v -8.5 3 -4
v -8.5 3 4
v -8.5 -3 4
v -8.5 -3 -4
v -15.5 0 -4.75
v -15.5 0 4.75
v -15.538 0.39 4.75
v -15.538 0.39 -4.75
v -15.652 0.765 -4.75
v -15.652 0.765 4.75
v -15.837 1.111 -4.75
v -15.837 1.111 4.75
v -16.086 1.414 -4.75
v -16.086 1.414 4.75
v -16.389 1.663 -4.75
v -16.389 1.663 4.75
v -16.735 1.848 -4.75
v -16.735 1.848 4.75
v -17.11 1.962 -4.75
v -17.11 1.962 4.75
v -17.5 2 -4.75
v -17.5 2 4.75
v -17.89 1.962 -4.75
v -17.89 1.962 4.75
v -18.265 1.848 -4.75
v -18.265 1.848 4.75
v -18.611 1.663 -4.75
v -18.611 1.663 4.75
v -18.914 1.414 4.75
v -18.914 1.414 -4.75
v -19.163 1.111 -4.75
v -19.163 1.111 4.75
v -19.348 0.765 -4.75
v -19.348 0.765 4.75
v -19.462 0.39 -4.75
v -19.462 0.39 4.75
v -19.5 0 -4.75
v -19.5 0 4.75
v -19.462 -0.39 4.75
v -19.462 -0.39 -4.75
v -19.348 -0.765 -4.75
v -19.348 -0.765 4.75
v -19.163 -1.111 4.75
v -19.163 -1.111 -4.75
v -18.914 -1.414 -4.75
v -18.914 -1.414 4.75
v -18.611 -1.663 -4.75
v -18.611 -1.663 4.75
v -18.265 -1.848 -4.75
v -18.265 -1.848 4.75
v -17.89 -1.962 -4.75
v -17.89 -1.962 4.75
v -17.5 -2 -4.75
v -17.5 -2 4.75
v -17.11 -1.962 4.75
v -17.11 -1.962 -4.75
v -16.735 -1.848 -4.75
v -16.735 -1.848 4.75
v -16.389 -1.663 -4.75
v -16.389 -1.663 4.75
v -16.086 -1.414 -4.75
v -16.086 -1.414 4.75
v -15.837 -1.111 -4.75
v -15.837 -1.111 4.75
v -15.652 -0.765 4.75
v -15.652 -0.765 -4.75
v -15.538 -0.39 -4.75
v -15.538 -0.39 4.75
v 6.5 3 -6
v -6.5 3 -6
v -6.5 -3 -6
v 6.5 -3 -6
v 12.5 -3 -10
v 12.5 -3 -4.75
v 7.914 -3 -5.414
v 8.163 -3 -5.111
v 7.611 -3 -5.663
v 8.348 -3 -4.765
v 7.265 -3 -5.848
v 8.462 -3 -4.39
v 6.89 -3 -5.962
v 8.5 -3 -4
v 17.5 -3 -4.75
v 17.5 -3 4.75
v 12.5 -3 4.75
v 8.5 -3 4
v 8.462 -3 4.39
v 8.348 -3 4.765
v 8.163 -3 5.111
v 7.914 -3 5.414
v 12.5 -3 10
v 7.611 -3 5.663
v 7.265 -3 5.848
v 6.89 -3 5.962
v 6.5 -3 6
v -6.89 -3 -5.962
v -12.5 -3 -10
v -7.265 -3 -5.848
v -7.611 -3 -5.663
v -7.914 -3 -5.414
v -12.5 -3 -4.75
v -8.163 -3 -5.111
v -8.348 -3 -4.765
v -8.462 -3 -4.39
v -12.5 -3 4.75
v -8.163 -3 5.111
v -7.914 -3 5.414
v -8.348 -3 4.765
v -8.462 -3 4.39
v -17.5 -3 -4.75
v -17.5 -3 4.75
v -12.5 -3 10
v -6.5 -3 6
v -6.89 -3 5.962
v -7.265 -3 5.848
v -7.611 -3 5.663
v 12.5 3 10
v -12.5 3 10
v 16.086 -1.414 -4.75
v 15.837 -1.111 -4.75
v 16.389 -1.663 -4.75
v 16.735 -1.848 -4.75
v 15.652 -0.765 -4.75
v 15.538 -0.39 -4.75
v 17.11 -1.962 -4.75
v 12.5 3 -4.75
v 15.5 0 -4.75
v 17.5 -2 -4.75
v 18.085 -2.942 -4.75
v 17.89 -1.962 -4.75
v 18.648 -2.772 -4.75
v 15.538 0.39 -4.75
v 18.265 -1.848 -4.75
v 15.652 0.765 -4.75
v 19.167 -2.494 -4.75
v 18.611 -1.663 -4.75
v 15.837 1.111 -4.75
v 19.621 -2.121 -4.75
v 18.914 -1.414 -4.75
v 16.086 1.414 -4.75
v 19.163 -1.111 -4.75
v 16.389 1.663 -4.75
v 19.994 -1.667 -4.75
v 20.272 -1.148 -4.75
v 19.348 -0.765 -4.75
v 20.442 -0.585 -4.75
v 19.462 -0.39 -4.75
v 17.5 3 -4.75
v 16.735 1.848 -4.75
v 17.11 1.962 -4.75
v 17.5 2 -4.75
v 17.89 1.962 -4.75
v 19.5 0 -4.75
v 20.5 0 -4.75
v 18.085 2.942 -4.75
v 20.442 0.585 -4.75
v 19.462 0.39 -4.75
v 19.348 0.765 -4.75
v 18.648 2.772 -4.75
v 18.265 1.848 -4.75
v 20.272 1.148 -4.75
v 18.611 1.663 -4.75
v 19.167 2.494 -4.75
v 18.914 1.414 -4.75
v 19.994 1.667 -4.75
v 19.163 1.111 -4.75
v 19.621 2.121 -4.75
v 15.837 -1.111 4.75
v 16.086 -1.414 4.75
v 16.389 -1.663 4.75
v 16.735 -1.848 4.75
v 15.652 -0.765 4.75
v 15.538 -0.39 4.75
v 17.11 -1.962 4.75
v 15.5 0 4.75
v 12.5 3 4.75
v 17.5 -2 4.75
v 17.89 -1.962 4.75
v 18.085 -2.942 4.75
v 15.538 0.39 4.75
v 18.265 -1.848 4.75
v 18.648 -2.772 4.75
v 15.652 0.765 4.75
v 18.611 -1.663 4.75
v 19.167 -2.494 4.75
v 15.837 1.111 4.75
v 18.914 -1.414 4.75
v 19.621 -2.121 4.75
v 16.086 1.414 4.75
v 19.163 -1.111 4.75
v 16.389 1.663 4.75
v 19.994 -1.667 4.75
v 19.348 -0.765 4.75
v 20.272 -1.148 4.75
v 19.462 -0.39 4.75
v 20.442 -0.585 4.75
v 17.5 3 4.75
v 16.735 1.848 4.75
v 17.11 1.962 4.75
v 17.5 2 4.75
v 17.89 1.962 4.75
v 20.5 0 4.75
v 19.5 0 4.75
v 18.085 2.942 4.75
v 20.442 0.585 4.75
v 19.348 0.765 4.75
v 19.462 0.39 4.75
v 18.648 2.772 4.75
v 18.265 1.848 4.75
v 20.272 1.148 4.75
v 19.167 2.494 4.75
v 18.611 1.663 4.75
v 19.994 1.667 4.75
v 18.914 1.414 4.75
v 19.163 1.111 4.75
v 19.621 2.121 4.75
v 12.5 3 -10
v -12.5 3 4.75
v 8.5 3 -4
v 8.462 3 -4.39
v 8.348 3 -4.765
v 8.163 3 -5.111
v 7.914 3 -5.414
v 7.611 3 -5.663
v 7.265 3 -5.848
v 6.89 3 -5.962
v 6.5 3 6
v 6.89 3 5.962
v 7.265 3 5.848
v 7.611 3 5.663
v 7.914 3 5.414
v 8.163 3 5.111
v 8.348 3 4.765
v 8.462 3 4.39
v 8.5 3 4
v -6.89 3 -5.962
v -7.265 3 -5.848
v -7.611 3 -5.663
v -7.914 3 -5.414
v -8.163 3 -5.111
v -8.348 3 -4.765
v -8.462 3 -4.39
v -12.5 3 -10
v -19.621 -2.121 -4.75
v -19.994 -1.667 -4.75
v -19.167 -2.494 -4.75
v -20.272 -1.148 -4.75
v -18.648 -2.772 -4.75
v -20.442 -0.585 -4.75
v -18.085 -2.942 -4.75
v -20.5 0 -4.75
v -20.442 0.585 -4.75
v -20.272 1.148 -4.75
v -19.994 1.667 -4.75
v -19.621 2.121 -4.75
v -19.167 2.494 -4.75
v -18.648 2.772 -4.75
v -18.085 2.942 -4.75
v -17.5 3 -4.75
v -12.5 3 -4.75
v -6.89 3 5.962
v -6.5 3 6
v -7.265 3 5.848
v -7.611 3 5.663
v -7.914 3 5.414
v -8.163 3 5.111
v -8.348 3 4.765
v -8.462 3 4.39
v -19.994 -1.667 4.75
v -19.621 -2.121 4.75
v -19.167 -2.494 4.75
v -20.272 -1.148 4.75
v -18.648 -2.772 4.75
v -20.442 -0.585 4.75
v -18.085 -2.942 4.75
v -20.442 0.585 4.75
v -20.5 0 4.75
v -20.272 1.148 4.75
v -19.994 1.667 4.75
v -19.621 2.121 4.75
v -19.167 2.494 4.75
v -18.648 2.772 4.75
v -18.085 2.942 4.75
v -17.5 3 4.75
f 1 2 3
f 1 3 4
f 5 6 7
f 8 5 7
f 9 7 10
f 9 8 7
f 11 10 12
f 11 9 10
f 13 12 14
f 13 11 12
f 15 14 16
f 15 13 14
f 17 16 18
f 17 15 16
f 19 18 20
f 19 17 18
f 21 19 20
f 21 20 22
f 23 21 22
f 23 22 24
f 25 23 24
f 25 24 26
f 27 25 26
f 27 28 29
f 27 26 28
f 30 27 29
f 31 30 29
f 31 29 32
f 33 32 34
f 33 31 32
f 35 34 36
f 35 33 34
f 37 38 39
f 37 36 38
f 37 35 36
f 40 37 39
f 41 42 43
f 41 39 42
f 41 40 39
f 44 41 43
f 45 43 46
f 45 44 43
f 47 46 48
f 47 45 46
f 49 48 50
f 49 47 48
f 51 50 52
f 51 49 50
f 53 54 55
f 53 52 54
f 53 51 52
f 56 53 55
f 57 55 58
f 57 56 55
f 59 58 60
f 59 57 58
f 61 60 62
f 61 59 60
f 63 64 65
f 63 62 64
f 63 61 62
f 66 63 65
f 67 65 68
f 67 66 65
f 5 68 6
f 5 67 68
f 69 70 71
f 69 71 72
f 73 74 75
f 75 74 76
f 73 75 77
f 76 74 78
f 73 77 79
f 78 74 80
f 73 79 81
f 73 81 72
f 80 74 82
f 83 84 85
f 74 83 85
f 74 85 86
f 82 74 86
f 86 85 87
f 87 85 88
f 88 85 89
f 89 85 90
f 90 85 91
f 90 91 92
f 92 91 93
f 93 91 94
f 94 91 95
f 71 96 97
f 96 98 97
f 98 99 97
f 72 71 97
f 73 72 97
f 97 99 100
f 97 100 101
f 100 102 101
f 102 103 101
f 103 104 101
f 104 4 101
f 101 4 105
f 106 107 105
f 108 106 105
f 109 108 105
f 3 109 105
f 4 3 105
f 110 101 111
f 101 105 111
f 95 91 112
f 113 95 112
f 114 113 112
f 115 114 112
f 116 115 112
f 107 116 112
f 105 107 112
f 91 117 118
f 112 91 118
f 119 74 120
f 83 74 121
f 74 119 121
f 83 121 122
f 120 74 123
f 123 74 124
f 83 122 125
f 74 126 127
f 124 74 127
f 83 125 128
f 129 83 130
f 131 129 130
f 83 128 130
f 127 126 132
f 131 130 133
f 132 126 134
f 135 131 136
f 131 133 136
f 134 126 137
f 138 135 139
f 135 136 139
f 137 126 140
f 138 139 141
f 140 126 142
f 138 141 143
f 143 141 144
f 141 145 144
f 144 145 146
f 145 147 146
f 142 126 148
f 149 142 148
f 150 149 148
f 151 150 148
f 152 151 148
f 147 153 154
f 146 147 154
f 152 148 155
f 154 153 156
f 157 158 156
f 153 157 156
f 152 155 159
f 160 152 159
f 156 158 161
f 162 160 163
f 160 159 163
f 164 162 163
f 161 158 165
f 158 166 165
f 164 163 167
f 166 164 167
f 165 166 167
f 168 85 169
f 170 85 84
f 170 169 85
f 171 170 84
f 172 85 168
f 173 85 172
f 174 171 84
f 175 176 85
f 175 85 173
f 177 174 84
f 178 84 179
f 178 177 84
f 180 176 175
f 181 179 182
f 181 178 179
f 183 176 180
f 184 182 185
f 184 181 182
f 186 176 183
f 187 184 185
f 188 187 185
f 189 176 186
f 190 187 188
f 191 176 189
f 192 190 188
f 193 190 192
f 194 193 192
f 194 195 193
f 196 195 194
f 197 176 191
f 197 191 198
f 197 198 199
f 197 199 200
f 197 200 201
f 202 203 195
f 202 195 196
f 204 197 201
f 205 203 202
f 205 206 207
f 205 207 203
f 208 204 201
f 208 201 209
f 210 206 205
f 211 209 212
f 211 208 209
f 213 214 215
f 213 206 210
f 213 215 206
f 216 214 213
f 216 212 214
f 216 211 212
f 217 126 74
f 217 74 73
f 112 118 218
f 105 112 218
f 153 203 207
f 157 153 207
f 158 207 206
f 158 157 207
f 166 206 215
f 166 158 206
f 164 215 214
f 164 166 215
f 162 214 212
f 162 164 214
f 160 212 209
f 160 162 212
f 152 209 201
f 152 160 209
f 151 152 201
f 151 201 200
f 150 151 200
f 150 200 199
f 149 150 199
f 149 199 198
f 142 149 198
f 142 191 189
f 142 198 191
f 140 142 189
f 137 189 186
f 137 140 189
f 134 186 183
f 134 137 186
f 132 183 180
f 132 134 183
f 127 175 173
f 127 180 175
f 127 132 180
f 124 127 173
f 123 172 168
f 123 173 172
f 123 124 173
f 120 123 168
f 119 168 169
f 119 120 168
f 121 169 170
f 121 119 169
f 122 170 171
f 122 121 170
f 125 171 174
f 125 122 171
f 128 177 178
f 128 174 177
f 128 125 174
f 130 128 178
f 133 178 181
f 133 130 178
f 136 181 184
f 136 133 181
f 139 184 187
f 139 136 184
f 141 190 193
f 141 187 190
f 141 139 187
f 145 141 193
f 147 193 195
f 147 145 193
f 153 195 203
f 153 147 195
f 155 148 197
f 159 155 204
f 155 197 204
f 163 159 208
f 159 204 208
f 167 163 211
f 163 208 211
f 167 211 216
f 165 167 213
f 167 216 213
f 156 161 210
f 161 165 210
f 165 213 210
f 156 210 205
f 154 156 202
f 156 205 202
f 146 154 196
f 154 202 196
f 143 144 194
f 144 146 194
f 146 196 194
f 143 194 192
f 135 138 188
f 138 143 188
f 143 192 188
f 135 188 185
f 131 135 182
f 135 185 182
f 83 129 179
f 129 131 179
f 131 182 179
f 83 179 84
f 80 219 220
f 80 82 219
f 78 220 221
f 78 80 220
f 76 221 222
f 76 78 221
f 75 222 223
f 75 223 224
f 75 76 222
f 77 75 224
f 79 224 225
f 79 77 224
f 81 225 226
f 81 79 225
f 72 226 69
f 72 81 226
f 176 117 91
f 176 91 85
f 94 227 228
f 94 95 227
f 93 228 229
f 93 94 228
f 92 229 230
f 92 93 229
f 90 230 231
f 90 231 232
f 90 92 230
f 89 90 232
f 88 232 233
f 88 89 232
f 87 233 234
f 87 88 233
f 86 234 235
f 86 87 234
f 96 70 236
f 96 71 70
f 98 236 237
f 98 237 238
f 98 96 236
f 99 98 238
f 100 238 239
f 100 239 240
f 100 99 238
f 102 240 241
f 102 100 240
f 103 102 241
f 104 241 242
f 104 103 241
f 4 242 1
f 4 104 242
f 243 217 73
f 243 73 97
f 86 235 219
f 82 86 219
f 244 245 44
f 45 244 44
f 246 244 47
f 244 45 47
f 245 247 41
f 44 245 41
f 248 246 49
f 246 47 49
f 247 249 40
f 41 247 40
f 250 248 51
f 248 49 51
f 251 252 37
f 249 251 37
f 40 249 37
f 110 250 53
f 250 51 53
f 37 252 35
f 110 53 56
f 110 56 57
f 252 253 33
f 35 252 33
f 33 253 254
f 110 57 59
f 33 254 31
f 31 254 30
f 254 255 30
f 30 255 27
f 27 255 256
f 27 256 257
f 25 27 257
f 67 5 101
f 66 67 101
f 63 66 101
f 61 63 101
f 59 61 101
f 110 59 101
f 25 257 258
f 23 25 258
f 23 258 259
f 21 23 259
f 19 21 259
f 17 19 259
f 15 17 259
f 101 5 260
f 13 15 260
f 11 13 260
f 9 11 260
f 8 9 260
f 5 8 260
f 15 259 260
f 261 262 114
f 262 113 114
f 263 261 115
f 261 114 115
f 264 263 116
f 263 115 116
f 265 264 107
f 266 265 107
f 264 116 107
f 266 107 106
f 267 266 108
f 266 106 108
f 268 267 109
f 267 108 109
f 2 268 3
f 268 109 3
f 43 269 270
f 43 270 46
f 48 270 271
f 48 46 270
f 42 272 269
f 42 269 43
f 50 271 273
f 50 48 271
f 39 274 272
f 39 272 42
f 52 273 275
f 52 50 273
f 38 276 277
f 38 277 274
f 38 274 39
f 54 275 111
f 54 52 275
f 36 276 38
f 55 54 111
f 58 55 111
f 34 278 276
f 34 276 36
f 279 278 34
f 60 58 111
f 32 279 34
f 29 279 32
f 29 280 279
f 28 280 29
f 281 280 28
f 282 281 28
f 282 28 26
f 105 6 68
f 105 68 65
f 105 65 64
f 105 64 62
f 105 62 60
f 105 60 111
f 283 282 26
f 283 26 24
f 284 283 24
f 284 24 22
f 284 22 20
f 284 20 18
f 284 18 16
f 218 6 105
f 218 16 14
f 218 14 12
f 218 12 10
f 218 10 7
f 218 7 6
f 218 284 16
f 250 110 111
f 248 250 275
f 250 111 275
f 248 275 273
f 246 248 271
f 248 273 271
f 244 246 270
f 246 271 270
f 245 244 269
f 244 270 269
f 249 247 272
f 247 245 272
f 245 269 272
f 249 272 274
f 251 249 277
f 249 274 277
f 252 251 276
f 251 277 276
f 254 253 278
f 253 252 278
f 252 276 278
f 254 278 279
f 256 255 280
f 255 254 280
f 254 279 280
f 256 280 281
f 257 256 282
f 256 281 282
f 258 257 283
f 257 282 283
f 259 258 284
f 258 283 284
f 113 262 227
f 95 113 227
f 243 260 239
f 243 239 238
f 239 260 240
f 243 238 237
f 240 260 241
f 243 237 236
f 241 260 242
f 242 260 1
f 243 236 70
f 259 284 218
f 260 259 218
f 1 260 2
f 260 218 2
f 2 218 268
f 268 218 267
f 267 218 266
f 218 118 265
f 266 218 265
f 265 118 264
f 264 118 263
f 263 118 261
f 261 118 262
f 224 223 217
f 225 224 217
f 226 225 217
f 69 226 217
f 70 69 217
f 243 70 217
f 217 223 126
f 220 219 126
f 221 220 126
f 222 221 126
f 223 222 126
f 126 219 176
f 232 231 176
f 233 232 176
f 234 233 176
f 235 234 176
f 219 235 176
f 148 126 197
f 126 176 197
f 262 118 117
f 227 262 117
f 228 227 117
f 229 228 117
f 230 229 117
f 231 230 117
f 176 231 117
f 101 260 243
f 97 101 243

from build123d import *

# Parameters (mm, degrees)
SKETCH1_R           = 2
BOSS_EXTRUDE1_DEPTH = 10
CUT_EXTRUDE3_REACH  = 25.585
SKETCH2_W           = 8
SKETCH2_H           = 5.25
SKETCH3_W           = 17
SKETCH3_H           = 12
CUT_EXTRUDE4_DEPTH  = 10
FILLET1_R           = 2


with BuildPart() as part:
    # Sketch1 → Boss-Extrude1 (new, symmetric)
    with BuildSketch(Plane.XY):
        with BuildLine():
            Line((17.5, -3), (-17.5, -3))
            ThreePointArc((-17.5, -3), (-20.5, 0), (-17.5, 3))
            Line((-17.5, 3), (17.5, 3))
            ThreePointArc((17.5, 3), (20.5, 0), (17.5, -3))
        make_face()
        with Locations((17.5, 0)):
            Circle(SKETCH1_R, mode=Mode.SUBTRACT)
        with Locations((-17.5, 0)):
            Circle(SKETCH1_R, mode=Mode.SUBTRACT)
    extrude(amount=BOSS_EXTRUDE1_DEPTH, both=True)

    # Cut-Extrude3: up to this face of the body (flat: up to its plane)
    cut_extrude3_end = Plane(part.part.faces().sort_by_distance((0, -3, 0))[0])
    # Sketch2 → Cut-Extrude3 (cut, up to the picked face)
    with BuildSketch(Plane(origin=(0, 3, 0), x_dir=(1, 0, 0), z_dir=(0, 1, 0)), mode=Mode.PRIVATE) as cut_extrude3_sk1:
        with Locations((-16.5, -7.375)):
            Rectangle(SKETCH2_W, SKETCH2_H)
    cut_extrude3_tool1 = split(extrude(cut_extrude3_sk1.sketch, amount=-CUT_EXTRUDE3_REACH, mode=Mode.PRIVATE), bisect_by=cut_extrude3_end, keep=Keep.BOTH, mode=Mode.PRIVATE)
    # Sketch2 → Cut-Extrude3 (cut, up to the picked face)
    with BuildSketch(Plane(origin=(0, 3, 0), x_dir=(1, 0, 0), z_dir=(0, 1, 0)), mode=Mode.PRIVATE) as cut_extrude3_sk2:
        with Locations((-16.5, 7.375)):
            Rectangle(SKETCH2_W, SKETCH2_H)
    cut_extrude3_tool2 = split(extrude(cut_extrude3_sk2.sketch, amount=-CUT_EXTRUDE3_REACH, mode=Mode.PRIVATE), bisect_by=cut_extrude3_end, keep=Keep.BOTH, mode=Mode.PRIVATE)
    # Sketch2 → Cut-Extrude3 (cut, up to the picked face)
    with BuildSketch(Plane(origin=(0, 3, 0), x_dir=(1, 0, 0), z_dir=(0, 1, 0)), mode=Mode.PRIVATE) as cut_extrude3_sk3:
        with Locations((16.5, 7.375)):
            Rectangle(SKETCH2_W, SKETCH2_H)
    cut_extrude3_tool3 = split(extrude(cut_extrude3_sk3.sketch, amount=-CUT_EXTRUDE3_REACH, mode=Mode.PRIVATE), bisect_by=cut_extrude3_end, keep=Keep.BOTH, mode=Mode.PRIVATE)
    # Sketch2 → Cut-Extrude3 (cut, up to the picked face)
    with BuildSketch(Plane(origin=(0, 3, 0), x_dir=(1, 0, 0), z_dir=(0, 1, 0)), mode=Mode.PRIVATE) as cut_extrude3_sk4:
        with Locations((16.5, -7.375)):
            Rectangle(SKETCH2_W, SKETCH2_H)
    cut_extrude3_tool4 = split(extrude(cut_extrude3_sk4.sketch, amount=-CUT_EXTRUDE3_REACH, mode=Mode.PRIVATE), bisect_by=cut_extrude3_end, keep=Keep.BOTH, mode=Mode.PRIVATE)
    add(cut_extrude3_tool1.solids().sort_by(Axis((-16.5, 3, 7.375), (0, -1, 0)))[0], mode=Mode.SUBTRACT)
    add(cut_extrude3_tool2.solids().sort_by(Axis((-16.5, 3, -7.375), (0, -1, 0)))[0], mode=Mode.SUBTRACT)
    add(cut_extrude3_tool3.solids().sort_by(Axis((16.5, 3, -7.375), (0, -1, 0)))[0], mode=Mode.SUBTRACT)
    add(cut_extrude3_tool4.solids().sort_by(Axis((16.5, 3, 7.375), (0, -1, 0)))[0], mode=Mode.SUBTRACT)

    # Sketch3 → Cut-Extrude4 (cut)
    with BuildSketch(Plane(origin=(0, 3, 0), x_dir=(1, 0, 0), z_dir=(0, 1, 0))):
        Rectangle(SKETCH3_W, SKETCH3_H)
    extrude(amount=-CUT_EXTRUDE4_DEPTH, mode=Mode.SUBTRACT)

    # Fillet1
    fillet1_edges = [part.edges().sort_by_distance(p)[0] for p in [
        (-8.5, 0, 6),
        (-8.5, 0, -6),
        (8.5, 0, -6),
        (8.5, 0, 6),
    ]]
    fillet(fillet1_edges, radius=FILLET1_R)


solid = part.part
